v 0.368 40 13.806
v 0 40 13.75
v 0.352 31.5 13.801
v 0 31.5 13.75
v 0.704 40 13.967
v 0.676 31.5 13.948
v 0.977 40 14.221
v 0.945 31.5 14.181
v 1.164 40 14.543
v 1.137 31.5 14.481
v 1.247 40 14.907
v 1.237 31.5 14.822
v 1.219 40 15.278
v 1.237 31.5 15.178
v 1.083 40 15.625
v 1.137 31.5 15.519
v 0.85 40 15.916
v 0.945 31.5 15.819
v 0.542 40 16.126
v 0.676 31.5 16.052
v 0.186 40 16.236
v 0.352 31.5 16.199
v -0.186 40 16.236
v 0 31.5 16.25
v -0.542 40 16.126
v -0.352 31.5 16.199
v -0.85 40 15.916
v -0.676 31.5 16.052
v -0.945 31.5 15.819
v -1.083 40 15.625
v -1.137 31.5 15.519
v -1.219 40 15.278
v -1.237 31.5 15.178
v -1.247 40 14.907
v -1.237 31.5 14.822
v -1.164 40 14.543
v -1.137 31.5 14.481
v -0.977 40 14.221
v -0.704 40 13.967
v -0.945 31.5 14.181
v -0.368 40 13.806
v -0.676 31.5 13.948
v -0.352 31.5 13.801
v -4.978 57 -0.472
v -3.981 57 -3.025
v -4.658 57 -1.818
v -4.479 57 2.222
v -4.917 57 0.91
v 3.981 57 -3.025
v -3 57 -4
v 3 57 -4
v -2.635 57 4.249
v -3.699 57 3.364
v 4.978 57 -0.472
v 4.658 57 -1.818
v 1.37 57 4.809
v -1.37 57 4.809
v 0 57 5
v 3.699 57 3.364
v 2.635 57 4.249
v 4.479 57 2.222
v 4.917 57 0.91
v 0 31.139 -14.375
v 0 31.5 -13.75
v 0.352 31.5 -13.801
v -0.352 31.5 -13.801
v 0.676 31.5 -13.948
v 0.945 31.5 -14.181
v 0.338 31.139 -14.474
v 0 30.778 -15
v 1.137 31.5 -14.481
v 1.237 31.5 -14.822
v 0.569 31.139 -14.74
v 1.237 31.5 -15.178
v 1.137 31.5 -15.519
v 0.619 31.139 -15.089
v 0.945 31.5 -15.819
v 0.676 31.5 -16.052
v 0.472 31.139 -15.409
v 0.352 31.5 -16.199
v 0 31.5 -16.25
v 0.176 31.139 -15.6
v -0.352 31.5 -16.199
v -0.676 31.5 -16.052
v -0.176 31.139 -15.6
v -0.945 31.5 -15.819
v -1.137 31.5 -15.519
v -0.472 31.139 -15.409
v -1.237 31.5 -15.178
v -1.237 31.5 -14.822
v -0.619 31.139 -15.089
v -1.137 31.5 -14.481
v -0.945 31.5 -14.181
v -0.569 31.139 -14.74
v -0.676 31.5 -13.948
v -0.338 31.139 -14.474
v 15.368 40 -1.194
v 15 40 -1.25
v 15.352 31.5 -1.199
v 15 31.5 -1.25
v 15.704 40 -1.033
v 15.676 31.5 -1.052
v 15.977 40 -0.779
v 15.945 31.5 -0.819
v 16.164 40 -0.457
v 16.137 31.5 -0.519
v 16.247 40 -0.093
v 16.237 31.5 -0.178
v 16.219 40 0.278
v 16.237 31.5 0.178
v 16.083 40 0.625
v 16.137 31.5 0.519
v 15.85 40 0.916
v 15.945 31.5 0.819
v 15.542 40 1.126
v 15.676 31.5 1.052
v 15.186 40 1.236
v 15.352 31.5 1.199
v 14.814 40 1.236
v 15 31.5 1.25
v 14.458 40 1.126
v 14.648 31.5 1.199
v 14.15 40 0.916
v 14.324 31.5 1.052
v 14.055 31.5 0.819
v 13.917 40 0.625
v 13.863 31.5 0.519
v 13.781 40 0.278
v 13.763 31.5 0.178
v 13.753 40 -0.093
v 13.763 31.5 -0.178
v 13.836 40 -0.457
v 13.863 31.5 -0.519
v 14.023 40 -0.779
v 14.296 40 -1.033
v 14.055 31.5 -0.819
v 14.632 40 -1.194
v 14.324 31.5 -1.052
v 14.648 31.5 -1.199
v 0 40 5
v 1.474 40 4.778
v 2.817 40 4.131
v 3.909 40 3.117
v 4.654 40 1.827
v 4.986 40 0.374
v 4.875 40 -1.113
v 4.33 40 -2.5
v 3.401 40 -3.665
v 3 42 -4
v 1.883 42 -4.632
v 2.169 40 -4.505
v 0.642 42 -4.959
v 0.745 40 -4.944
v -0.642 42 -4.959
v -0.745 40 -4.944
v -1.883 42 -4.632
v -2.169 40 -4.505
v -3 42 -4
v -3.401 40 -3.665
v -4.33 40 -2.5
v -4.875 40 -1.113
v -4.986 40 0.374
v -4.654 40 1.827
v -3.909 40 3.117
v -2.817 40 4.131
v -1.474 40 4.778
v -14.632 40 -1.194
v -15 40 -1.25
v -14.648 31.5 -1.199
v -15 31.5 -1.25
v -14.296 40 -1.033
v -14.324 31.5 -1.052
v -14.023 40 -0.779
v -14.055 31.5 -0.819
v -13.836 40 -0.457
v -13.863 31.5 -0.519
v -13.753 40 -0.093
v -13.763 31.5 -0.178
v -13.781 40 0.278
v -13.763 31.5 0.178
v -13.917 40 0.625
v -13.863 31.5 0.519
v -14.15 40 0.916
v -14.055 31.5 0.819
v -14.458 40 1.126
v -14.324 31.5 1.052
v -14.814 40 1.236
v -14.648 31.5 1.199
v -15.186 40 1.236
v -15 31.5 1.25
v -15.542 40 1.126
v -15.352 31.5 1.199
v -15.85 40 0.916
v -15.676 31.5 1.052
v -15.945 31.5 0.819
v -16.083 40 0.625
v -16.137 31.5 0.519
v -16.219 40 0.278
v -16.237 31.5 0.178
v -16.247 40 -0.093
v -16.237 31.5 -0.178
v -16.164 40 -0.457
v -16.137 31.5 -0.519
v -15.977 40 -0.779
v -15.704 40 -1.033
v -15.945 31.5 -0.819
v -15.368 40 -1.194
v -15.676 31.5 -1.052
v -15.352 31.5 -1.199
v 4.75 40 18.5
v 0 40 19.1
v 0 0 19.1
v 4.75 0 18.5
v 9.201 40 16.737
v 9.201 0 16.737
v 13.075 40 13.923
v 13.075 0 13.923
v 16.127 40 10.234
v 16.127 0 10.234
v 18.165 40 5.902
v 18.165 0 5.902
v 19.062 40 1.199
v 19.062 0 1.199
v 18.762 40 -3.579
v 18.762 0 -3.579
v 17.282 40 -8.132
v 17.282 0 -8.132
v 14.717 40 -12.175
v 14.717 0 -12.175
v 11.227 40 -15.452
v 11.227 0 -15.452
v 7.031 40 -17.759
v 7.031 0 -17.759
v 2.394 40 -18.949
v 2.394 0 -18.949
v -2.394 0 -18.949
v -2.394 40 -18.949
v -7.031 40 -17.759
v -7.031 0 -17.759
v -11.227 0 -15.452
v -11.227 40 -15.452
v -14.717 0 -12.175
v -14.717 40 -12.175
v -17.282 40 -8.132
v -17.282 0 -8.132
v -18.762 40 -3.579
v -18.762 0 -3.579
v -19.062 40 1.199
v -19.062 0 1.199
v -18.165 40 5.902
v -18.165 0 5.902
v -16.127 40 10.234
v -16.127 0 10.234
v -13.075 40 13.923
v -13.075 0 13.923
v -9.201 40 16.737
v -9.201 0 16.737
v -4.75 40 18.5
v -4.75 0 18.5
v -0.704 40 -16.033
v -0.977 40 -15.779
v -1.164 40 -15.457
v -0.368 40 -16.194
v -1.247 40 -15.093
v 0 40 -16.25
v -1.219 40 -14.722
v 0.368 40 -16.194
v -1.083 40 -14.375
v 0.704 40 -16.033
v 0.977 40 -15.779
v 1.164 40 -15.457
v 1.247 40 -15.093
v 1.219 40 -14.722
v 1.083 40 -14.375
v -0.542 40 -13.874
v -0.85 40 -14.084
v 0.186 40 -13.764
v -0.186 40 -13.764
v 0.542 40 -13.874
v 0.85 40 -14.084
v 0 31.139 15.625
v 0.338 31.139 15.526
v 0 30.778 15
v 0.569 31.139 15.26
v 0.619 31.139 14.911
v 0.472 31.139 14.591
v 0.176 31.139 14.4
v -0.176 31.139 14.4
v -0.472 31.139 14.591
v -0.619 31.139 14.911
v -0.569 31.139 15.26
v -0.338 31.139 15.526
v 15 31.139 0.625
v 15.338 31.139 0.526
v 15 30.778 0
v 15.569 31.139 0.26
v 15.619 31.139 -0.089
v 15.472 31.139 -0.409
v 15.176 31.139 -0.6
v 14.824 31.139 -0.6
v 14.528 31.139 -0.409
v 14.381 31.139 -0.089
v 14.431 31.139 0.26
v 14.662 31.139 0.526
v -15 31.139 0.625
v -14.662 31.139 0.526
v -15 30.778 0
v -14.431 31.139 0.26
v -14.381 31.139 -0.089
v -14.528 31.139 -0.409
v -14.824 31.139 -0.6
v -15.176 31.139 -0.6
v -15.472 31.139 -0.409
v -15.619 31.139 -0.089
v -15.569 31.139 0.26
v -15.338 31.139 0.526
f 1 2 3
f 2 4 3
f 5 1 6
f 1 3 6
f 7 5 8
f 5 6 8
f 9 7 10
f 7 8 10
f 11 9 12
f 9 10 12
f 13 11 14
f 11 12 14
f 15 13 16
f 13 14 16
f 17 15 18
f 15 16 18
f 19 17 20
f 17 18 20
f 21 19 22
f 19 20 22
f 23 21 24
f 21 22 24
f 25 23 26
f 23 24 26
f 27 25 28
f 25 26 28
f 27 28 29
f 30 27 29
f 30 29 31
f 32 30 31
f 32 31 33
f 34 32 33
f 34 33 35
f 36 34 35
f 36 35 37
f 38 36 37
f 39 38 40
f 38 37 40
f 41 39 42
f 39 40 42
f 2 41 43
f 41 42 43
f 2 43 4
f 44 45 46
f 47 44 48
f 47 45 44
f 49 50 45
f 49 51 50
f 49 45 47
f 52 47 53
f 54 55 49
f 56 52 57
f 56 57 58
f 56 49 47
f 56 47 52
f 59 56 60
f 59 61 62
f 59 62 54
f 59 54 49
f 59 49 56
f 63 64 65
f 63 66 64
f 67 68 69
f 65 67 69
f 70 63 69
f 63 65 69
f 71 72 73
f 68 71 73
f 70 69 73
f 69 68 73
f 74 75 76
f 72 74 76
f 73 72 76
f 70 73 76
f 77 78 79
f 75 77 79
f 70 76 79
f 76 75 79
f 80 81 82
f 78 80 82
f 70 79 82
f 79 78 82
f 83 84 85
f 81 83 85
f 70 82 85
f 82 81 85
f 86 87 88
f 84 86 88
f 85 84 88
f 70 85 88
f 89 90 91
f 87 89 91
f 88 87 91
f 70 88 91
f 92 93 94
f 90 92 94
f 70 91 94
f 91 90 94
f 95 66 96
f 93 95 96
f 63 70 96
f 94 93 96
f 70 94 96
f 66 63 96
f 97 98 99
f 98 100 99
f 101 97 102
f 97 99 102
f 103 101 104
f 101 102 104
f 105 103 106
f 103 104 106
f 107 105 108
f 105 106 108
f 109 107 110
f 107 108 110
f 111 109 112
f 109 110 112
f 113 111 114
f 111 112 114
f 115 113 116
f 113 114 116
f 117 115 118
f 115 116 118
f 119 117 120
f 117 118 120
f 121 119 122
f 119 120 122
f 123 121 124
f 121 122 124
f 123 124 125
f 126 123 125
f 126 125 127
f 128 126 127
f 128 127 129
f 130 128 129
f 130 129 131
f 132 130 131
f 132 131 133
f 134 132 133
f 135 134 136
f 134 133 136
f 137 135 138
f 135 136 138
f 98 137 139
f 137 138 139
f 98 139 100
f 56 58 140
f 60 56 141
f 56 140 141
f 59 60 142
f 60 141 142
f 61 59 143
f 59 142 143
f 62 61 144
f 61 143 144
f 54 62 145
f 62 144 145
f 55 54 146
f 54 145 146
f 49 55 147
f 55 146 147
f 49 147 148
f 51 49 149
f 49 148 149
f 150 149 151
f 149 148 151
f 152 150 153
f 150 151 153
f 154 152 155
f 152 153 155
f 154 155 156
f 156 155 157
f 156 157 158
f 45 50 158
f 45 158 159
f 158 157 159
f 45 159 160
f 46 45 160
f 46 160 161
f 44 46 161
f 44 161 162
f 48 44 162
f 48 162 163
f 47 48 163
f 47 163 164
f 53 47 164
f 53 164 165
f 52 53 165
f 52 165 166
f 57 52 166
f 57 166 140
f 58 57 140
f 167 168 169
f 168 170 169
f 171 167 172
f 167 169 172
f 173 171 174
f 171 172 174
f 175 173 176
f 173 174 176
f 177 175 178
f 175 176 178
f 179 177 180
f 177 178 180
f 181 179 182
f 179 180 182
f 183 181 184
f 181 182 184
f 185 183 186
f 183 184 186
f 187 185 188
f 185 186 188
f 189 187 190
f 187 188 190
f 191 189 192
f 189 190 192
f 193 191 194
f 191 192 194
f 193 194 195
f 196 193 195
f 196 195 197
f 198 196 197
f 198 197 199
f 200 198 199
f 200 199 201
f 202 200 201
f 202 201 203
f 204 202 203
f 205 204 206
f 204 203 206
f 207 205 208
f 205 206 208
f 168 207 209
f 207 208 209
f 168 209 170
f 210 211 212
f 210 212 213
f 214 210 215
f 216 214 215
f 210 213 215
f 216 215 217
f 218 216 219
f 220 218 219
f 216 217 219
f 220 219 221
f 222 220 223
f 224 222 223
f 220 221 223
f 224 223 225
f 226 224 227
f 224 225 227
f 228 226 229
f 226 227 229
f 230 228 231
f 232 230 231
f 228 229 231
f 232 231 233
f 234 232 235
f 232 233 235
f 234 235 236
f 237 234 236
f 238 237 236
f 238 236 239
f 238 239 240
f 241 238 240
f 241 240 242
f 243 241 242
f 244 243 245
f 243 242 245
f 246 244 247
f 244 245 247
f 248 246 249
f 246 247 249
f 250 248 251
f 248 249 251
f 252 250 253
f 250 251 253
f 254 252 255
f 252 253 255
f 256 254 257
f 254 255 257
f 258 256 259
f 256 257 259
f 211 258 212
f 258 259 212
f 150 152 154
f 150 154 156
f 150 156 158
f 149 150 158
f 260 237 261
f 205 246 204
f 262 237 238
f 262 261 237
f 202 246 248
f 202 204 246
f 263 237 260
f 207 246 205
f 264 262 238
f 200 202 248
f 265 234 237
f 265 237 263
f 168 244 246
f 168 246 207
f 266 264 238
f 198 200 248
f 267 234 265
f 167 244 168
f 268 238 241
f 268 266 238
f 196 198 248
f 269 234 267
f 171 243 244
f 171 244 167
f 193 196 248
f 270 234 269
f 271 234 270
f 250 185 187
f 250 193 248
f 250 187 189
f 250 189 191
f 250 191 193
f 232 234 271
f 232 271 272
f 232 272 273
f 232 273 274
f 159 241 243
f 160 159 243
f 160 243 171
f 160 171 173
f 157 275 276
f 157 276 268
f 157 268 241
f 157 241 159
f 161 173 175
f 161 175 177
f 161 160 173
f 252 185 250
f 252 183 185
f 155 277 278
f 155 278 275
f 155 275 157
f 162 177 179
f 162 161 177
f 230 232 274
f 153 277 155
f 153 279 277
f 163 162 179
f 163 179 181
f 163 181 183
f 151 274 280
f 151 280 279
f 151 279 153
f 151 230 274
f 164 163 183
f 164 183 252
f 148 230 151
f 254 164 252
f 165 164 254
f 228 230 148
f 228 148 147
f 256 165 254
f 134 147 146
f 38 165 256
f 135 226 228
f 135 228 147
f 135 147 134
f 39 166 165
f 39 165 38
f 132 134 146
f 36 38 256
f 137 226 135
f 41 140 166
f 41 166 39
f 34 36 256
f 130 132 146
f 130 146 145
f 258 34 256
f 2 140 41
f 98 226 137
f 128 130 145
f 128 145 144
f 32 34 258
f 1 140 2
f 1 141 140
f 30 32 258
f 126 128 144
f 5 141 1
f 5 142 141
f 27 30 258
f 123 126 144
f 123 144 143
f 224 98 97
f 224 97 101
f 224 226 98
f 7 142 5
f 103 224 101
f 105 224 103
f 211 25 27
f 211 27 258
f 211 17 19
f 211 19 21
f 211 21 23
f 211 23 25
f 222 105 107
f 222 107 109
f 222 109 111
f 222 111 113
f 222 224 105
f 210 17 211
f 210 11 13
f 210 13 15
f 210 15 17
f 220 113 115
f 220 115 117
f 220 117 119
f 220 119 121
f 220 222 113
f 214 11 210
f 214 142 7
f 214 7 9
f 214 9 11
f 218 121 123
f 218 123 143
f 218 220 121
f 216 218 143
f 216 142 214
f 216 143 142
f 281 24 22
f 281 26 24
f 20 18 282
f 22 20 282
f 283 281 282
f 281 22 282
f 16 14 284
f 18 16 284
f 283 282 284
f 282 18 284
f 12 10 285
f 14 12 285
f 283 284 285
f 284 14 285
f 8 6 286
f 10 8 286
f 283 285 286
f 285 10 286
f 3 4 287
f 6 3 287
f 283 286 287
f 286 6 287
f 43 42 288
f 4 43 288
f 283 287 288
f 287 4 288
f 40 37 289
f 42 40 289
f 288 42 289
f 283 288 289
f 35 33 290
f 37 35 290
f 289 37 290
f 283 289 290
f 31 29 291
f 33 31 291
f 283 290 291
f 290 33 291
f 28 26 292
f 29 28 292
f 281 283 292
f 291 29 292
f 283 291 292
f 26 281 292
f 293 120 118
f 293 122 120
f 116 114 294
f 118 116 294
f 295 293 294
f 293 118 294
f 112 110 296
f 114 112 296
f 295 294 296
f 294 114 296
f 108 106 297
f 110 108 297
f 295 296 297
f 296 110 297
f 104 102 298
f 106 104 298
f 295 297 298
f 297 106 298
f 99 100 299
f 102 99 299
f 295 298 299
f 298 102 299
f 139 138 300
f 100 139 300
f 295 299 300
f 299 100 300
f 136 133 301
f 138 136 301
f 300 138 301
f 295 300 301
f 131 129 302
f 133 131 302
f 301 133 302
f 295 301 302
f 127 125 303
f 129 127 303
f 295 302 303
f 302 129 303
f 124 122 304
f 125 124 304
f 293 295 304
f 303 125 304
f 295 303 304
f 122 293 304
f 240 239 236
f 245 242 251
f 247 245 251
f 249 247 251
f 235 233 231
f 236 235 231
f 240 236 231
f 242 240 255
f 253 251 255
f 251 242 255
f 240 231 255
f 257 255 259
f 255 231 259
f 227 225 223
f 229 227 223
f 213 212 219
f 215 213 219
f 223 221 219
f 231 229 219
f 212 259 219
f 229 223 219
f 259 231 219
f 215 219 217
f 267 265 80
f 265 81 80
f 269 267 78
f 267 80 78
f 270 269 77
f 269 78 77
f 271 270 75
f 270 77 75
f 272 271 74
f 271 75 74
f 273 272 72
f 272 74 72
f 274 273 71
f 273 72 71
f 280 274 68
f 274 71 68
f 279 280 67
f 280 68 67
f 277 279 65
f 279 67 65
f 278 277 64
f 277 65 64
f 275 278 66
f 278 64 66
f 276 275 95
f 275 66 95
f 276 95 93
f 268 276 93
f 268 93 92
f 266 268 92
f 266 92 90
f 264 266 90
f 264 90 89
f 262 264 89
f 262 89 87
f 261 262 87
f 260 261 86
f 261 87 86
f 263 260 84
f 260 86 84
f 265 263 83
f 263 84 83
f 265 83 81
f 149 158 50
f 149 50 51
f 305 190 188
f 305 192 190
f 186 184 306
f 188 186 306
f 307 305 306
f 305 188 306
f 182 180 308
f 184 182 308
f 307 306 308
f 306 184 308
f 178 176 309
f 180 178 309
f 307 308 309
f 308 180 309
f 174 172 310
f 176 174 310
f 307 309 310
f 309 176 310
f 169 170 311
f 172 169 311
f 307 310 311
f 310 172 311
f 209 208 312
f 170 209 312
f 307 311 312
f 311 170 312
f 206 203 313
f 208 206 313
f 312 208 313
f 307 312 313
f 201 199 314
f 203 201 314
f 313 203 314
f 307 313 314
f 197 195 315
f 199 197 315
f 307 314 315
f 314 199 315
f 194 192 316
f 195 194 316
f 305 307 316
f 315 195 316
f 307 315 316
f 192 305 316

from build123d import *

# Parameters (mm, degrees)
SKETCH_1_R             = 19.1
EXTRUDE_1_DEPTH        = 40
SKETCH_2_R             = 5
EXTRUDE_2_DEPTH        = 17
CUT_EXTRUDE_START      = -15
CUT_EXTRUDE_1_DEPTH    = 15
HOLE_WIZARD_M3_1_D     = 2.5
HOLE_WIZARD_M3_1_DEPTH = 8.5
HOLE_WIZARD_M3_1_TIP   = 0.721687836


with BuildPart() as part:
    # 草图1 → 凸台-拉伸1 (new body)
    with BuildSketch(Plane(origin=(0, 0, 0), x_dir=(1, 0, 0), z_dir=(0, 1, 0))):
        with Locations(Location((0, 0, 0), (0, 0, 270))):
            Circle(SKETCH_1_R)
    extrude(amount=EXTRUDE_1_DEPTH)

    # 草图2 → 凸台-拉伸2 (add)
    with BuildSketch(Plane(origin=(0, 40, 0), x_dir=(1, 0, 0), z_dir=(0, 1, 0))):
        with Locations(Location((0, 0, 0), (0, 0, 270))):
            Circle(SKETCH_2_R)
    extrude(amount=EXTRUDE_2_DEPTH)

    # 草图3 → 切除-拉伸1 (cut)
    with BuildSketch(Plane(origin=(0, 57, 0), x_dir=(1, 0, 0), z_dir=(0, 1, 0)).offset(CUT_EXTRUDE_START)):
        with BuildLine():
            Line((-3, 4), (3, 4))
            ThreePointArc((3, 4), (0, 5), (-3, 4))
        make_face()
    extrude(amount=CUT_EXTRUDE_1_DEPTH, mode=Mode.SUBTRACT)

    # M3 螺纹孔1
    with Locations(Plane(origin=(0, 40, -15), x_dir=(0, 0, 1), z_dir=(0, 1, 0))):
        with Locations((0, 0), (15, -15), (15, 15), (30, 0)):
            Hole(HOLE_WIZARD_M3_1_D / 2, depth=HOLE_WIZARD_M3_1_DEPTH)
            with Locations((0, 0, -(HOLE_WIZARD_M3_1_DEPTH + HOLE_WIZARD_M3_1_TIP / 2))):  # 120° drill point
                Cone(0, HOLE_WIZARD_M3_1_D / 2, HOLE_WIZARD_M3_1_TIP, mode=Mode.SUBTRACT)


solid = part.part
